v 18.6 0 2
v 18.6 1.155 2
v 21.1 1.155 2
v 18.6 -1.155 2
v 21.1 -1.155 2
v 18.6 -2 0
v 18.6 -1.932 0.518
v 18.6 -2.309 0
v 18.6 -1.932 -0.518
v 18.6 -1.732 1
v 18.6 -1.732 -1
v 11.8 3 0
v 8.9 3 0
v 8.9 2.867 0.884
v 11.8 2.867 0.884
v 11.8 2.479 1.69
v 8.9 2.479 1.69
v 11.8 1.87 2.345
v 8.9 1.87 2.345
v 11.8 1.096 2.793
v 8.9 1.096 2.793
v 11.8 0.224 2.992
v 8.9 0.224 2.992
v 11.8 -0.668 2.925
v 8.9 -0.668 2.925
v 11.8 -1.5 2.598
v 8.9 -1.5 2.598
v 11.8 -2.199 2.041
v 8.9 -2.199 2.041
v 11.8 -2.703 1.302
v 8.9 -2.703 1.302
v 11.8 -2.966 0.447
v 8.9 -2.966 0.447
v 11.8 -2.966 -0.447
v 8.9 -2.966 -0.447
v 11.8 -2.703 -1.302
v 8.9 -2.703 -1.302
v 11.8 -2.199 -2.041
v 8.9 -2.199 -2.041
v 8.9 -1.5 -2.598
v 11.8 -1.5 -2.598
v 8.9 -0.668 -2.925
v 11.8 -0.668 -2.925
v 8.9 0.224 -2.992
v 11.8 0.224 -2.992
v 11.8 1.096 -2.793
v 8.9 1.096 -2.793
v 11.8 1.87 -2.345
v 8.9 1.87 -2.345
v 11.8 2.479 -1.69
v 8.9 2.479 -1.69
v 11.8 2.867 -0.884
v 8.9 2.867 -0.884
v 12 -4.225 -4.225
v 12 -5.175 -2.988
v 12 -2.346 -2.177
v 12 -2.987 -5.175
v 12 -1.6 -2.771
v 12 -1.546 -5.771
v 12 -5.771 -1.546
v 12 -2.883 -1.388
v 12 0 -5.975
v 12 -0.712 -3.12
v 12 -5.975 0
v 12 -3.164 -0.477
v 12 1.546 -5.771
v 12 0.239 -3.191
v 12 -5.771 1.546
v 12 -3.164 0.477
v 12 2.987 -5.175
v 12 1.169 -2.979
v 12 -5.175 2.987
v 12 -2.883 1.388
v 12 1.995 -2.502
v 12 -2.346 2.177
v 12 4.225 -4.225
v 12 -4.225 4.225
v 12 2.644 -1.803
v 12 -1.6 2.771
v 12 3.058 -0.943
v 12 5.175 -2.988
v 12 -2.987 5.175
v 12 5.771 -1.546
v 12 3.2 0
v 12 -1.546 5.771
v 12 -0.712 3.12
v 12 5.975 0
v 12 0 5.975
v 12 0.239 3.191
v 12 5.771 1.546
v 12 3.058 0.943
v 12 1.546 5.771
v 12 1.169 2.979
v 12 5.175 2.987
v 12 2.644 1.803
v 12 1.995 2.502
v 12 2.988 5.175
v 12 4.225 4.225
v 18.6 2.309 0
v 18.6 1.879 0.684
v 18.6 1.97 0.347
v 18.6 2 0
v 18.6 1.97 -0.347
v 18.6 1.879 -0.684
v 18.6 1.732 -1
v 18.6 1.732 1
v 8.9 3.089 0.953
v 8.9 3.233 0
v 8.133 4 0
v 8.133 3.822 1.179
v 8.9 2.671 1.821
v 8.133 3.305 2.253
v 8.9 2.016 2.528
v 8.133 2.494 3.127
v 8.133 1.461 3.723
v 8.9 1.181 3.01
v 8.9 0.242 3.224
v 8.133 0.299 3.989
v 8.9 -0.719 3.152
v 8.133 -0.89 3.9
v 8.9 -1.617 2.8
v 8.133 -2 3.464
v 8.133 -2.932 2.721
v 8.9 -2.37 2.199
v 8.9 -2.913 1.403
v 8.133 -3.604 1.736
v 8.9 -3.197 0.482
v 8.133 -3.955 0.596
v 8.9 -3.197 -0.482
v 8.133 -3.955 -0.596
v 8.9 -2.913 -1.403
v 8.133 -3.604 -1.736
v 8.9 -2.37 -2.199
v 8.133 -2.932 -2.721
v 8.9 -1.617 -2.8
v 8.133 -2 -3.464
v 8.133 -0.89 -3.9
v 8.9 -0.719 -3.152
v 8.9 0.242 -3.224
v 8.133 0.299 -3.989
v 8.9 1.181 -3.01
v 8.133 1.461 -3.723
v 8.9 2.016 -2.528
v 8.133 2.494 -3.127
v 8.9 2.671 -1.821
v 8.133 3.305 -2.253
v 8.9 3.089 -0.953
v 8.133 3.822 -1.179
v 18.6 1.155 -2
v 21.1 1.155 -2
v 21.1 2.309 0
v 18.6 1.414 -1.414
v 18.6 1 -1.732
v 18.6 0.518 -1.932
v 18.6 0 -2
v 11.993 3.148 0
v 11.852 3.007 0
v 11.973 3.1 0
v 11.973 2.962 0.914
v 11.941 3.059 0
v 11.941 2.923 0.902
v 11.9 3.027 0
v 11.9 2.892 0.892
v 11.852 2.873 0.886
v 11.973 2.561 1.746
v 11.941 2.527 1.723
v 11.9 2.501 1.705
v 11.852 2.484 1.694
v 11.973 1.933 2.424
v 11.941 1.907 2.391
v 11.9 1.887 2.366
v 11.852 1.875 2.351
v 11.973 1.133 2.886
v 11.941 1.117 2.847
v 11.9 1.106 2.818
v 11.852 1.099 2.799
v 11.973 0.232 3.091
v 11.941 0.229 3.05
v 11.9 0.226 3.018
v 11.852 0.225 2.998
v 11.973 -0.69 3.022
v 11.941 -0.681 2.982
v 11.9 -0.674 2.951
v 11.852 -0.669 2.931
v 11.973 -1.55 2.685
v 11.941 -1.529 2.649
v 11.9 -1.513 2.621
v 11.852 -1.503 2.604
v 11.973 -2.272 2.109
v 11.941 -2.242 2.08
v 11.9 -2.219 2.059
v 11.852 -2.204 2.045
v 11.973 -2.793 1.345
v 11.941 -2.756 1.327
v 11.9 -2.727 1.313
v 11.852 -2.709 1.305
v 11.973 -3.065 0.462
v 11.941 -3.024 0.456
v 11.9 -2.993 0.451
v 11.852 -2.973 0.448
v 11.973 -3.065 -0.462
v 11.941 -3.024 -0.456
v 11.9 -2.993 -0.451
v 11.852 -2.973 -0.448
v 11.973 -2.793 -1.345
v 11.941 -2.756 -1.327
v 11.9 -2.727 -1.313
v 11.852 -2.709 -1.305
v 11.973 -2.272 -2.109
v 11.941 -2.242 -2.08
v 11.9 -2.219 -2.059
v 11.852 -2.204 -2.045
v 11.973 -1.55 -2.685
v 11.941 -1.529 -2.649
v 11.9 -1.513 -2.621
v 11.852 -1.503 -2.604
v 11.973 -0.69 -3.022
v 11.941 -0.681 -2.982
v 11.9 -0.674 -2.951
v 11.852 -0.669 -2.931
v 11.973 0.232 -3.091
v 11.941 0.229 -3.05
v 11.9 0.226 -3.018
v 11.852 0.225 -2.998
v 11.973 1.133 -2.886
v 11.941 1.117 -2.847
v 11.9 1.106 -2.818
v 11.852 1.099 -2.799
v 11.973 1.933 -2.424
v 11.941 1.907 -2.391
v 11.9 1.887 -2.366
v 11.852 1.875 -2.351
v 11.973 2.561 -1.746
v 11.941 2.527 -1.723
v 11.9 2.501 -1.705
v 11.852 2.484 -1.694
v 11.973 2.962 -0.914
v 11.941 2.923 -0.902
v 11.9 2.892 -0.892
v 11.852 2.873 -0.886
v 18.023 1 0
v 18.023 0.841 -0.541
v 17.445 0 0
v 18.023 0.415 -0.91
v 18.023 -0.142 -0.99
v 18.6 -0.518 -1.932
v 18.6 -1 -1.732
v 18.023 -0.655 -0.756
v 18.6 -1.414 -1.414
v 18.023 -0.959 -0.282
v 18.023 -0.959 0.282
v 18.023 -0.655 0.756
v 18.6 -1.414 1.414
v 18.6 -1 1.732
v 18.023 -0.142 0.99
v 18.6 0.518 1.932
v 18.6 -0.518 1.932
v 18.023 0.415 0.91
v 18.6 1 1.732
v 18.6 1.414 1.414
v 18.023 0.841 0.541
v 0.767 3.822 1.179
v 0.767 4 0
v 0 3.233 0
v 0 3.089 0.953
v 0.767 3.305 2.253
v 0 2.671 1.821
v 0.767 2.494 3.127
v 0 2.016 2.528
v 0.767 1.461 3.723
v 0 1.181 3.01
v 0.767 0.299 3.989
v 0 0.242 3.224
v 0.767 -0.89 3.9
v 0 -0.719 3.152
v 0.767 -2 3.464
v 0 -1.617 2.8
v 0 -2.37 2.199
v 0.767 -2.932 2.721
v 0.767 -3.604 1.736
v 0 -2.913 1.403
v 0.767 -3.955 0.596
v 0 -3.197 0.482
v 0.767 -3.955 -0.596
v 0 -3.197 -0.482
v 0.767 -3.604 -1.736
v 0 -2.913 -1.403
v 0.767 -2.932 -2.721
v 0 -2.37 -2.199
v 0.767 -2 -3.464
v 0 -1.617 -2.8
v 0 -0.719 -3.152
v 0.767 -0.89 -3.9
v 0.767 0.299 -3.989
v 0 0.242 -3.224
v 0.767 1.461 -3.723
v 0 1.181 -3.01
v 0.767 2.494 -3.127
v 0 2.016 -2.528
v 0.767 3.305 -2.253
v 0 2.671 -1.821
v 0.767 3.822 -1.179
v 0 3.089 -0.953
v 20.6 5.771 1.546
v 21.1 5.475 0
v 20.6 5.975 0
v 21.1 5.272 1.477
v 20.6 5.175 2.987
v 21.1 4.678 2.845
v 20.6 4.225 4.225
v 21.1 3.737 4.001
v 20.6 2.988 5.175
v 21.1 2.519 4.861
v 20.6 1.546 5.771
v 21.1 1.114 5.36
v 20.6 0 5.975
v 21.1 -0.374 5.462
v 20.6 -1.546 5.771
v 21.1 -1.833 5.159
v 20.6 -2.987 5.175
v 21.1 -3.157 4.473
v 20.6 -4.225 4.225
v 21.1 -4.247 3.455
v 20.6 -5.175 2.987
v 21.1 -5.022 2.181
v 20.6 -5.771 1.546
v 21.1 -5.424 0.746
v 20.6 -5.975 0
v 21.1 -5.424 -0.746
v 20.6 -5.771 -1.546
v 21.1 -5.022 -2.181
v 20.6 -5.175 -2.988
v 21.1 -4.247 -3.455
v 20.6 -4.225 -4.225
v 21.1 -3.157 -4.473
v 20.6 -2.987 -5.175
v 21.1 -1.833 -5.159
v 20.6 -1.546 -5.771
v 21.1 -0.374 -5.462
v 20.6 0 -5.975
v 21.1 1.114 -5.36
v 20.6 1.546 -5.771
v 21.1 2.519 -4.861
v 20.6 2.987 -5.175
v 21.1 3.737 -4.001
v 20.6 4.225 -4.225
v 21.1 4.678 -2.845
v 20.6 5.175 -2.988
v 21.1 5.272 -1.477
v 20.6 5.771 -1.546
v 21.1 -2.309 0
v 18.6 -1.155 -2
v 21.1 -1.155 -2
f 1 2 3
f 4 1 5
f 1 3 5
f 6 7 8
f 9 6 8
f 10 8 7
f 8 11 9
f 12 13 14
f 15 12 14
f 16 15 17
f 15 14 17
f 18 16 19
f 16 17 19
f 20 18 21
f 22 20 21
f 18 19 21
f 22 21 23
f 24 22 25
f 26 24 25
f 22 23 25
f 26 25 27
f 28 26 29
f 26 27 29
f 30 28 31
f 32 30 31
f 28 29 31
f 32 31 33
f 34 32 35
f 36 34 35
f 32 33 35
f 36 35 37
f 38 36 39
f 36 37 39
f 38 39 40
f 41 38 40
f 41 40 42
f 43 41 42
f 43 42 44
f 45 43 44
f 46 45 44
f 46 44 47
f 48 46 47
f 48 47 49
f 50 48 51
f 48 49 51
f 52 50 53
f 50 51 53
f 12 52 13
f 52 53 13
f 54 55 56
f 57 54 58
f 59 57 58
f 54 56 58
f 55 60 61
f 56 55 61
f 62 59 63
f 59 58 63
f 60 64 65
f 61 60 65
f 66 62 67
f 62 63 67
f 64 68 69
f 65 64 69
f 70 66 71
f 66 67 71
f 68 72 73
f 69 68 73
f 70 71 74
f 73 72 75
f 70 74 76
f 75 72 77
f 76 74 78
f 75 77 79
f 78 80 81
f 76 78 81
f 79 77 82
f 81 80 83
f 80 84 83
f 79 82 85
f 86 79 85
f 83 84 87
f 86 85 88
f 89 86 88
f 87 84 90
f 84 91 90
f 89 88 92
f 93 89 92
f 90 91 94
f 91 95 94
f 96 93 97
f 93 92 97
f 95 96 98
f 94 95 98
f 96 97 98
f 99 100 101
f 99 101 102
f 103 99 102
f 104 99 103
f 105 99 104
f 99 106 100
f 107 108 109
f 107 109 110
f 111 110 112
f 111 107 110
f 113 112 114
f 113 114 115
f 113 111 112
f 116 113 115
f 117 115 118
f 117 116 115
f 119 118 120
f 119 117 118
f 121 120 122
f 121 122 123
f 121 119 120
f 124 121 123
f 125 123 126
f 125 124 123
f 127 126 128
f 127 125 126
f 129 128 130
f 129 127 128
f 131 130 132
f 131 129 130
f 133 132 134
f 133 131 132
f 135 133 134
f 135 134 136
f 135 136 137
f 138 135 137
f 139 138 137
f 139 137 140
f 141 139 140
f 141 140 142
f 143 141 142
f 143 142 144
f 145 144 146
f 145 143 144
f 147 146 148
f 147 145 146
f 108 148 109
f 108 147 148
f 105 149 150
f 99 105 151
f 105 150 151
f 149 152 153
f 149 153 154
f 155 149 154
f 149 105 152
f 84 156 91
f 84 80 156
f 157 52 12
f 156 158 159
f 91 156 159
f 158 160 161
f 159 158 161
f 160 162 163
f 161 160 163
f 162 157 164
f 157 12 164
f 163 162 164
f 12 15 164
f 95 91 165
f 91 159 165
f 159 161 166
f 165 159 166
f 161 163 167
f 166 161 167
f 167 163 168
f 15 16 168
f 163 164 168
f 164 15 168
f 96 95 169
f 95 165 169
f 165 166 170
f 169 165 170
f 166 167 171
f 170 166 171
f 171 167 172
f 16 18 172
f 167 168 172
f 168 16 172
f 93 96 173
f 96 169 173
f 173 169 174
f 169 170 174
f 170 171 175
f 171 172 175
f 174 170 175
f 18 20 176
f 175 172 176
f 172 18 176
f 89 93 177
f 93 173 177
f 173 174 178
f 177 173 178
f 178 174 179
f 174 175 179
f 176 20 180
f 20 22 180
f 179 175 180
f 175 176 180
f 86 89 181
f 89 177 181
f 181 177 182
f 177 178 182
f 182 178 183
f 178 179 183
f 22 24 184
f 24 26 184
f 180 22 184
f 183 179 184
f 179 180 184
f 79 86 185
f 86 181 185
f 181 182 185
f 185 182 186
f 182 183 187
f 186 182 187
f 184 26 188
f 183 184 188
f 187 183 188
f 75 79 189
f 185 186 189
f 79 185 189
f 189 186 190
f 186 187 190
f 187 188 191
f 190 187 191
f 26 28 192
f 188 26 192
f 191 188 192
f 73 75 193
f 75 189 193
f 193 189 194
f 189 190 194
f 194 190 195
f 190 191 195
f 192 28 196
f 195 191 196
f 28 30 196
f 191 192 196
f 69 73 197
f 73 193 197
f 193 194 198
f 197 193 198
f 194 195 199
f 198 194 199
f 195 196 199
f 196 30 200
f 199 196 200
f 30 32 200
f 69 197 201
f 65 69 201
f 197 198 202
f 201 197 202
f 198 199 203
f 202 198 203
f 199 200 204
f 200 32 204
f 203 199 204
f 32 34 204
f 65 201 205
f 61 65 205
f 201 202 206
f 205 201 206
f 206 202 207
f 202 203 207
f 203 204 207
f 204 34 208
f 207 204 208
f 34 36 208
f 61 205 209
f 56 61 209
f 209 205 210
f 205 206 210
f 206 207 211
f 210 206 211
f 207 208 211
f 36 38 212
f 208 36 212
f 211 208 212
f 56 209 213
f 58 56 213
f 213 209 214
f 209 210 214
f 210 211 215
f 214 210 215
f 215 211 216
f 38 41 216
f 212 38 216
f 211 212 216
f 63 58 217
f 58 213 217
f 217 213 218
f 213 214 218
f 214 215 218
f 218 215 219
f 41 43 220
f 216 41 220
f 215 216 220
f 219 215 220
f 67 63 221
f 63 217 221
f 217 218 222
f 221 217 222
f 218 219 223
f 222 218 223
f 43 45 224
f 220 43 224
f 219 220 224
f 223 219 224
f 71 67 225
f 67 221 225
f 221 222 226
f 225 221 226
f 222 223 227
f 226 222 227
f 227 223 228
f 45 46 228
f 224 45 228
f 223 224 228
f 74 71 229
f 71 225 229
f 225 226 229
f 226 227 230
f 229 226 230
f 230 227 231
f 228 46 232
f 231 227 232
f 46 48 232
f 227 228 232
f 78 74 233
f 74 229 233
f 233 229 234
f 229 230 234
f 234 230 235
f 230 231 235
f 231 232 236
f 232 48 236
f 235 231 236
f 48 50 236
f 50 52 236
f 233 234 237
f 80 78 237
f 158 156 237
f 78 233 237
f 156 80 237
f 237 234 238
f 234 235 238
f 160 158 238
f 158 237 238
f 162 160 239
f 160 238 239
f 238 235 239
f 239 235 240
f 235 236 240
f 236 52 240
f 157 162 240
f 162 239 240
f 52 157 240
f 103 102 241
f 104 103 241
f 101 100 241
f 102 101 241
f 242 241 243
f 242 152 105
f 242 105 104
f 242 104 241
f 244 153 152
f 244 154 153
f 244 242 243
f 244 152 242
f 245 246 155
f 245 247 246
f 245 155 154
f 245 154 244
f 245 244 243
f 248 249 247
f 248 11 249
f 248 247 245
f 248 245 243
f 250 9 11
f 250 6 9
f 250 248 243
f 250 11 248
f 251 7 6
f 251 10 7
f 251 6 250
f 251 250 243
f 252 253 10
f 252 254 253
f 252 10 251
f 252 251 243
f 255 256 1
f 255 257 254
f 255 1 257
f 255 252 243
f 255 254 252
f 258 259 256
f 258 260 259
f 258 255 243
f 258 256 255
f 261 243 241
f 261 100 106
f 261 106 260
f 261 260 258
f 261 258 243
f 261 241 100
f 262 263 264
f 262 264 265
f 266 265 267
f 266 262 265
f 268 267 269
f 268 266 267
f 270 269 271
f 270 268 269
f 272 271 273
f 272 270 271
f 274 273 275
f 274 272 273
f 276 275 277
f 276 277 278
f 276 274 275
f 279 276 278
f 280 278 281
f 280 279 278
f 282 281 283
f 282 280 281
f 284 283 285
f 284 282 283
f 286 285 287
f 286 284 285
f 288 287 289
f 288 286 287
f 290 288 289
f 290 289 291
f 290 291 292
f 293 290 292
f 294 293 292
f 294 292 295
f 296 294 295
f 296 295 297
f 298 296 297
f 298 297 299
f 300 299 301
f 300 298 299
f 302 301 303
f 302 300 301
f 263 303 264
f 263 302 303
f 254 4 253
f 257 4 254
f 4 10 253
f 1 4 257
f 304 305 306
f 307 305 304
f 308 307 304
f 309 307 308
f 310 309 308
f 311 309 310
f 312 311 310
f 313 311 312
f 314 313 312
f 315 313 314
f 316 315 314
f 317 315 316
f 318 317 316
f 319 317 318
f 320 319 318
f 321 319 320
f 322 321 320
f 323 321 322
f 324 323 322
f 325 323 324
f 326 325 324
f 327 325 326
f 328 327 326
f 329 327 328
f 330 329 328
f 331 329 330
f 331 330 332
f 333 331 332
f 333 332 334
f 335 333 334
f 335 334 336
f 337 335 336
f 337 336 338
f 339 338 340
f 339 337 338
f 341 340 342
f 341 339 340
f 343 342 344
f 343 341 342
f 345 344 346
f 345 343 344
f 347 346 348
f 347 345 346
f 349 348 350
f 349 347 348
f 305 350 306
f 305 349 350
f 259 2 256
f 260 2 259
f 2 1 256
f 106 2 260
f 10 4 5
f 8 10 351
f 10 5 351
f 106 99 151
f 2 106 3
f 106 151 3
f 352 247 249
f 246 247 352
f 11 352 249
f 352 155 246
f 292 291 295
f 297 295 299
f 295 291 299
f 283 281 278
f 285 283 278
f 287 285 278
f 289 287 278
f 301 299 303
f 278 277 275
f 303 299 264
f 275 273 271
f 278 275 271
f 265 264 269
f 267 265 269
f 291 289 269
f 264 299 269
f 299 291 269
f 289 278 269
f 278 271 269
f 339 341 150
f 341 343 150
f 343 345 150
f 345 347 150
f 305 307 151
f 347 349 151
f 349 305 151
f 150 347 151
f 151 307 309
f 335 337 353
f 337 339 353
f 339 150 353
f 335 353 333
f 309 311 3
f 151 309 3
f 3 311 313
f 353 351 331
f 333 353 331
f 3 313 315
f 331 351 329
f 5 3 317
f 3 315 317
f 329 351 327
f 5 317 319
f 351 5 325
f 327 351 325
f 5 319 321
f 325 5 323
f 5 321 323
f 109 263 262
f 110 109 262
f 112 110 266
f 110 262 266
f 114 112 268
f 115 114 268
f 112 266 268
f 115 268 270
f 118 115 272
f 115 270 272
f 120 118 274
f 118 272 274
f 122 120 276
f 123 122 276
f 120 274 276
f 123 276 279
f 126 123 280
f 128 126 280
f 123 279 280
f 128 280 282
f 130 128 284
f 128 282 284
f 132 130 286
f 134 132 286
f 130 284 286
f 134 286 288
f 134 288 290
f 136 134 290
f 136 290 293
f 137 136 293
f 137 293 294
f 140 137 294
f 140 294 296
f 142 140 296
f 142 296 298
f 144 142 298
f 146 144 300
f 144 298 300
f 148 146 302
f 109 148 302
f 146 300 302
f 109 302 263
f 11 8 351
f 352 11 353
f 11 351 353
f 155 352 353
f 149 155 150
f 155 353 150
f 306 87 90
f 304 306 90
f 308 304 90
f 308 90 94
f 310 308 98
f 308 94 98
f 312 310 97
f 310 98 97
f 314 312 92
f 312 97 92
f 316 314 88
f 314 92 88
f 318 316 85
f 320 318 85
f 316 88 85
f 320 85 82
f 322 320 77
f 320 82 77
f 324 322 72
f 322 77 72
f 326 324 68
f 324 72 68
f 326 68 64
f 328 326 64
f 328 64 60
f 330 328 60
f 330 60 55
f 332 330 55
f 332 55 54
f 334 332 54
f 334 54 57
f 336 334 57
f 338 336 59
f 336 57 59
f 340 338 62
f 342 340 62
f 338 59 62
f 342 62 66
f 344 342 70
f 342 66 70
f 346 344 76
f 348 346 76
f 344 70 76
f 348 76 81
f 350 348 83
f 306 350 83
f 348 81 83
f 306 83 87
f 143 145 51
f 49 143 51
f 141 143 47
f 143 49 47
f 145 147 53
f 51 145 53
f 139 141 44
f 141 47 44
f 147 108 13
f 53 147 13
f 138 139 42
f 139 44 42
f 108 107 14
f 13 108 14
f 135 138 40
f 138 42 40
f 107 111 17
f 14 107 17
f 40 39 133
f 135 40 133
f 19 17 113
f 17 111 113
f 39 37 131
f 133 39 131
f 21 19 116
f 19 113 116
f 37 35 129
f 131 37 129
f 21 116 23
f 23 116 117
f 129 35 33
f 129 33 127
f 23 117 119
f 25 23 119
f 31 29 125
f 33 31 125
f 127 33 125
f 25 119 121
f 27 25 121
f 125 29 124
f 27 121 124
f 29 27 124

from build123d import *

# Parameters (mm, degrees)
CUT_EXTRUDE1_DEPTH = 2.5
CHAMFER1_SIZE      = 0.767
CHAMFER2_SIZE      = 0.5
FILLET1_R          = 0.2


with BuildPart() as part:
    # Sketch1 → Revolve1 (revolve)
    with BuildSketch(Plane.XY):
        Polygon((0, 4), (0, 0), (21.1, 0), (21.1, 5.975), (12, 5.975), (12, 3), (8.9, 3), (8.9, 4), align=None)
    revolve(axis=Axis((0, 0, 0), (1, 0, 0)))

    # Sketch2 → Cut-Extrude1 (cut)
    with BuildSketch(Plane(origin=(21.1, 0, 0), x_dir=(0, 0, -1), z_dir=(1, 0, 0))):
        Polygon((0, -2.309401077), (2, -1.154700538), (2, 1.154700538), (0, 2.309401077), (-2, 1.154700538), (-2, -1.154700538), align=None)
    extrude(amount=-CUT_EXTRUDE1_DEPTH, mode=Mode.SUBTRACT)

    # Sketch3 → Cut-Revolve1 (revolve, cut)
    with BuildSketch(Plane(origin=(0, 0, 0), x_dir=(-1, 0, 0), z_dir=(0, 0, -1))):
        Polygon((-18.6, 2), (-18.6, 0), (-17.445299462, 0), align=None)
    revolve(axis=Axis((18.600025, 0, 0), (-1, 0, 0)), mode=Mode.SUBTRACT)

    # Chamfer1
    chamfer1_edges = [part.edges().sort_by_distance(p)[0] for p in [
        (0, -4, 0),
        (8.9, -4, 0),
    ]]
    chamfer(chamfer1_edges, length=CHAMFER1_SIZE)

    # Chamfer2
    chamfer2_edges = [part.edges().sort_by_distance(p)[0] for p in [
        (21.1, -5.975, 0),
    ]]
    chamfer(chamfer2_edges, length=CHAMFER2_SIZE)

    # Fillet1
    fillet1_edges = [part.edges().sort_by_distance(p)[0] for p in [
        (12, -3, 0),
    ]]
    fillet(fillet1_edges, radius=FILLET1_R)


solid = part.part
